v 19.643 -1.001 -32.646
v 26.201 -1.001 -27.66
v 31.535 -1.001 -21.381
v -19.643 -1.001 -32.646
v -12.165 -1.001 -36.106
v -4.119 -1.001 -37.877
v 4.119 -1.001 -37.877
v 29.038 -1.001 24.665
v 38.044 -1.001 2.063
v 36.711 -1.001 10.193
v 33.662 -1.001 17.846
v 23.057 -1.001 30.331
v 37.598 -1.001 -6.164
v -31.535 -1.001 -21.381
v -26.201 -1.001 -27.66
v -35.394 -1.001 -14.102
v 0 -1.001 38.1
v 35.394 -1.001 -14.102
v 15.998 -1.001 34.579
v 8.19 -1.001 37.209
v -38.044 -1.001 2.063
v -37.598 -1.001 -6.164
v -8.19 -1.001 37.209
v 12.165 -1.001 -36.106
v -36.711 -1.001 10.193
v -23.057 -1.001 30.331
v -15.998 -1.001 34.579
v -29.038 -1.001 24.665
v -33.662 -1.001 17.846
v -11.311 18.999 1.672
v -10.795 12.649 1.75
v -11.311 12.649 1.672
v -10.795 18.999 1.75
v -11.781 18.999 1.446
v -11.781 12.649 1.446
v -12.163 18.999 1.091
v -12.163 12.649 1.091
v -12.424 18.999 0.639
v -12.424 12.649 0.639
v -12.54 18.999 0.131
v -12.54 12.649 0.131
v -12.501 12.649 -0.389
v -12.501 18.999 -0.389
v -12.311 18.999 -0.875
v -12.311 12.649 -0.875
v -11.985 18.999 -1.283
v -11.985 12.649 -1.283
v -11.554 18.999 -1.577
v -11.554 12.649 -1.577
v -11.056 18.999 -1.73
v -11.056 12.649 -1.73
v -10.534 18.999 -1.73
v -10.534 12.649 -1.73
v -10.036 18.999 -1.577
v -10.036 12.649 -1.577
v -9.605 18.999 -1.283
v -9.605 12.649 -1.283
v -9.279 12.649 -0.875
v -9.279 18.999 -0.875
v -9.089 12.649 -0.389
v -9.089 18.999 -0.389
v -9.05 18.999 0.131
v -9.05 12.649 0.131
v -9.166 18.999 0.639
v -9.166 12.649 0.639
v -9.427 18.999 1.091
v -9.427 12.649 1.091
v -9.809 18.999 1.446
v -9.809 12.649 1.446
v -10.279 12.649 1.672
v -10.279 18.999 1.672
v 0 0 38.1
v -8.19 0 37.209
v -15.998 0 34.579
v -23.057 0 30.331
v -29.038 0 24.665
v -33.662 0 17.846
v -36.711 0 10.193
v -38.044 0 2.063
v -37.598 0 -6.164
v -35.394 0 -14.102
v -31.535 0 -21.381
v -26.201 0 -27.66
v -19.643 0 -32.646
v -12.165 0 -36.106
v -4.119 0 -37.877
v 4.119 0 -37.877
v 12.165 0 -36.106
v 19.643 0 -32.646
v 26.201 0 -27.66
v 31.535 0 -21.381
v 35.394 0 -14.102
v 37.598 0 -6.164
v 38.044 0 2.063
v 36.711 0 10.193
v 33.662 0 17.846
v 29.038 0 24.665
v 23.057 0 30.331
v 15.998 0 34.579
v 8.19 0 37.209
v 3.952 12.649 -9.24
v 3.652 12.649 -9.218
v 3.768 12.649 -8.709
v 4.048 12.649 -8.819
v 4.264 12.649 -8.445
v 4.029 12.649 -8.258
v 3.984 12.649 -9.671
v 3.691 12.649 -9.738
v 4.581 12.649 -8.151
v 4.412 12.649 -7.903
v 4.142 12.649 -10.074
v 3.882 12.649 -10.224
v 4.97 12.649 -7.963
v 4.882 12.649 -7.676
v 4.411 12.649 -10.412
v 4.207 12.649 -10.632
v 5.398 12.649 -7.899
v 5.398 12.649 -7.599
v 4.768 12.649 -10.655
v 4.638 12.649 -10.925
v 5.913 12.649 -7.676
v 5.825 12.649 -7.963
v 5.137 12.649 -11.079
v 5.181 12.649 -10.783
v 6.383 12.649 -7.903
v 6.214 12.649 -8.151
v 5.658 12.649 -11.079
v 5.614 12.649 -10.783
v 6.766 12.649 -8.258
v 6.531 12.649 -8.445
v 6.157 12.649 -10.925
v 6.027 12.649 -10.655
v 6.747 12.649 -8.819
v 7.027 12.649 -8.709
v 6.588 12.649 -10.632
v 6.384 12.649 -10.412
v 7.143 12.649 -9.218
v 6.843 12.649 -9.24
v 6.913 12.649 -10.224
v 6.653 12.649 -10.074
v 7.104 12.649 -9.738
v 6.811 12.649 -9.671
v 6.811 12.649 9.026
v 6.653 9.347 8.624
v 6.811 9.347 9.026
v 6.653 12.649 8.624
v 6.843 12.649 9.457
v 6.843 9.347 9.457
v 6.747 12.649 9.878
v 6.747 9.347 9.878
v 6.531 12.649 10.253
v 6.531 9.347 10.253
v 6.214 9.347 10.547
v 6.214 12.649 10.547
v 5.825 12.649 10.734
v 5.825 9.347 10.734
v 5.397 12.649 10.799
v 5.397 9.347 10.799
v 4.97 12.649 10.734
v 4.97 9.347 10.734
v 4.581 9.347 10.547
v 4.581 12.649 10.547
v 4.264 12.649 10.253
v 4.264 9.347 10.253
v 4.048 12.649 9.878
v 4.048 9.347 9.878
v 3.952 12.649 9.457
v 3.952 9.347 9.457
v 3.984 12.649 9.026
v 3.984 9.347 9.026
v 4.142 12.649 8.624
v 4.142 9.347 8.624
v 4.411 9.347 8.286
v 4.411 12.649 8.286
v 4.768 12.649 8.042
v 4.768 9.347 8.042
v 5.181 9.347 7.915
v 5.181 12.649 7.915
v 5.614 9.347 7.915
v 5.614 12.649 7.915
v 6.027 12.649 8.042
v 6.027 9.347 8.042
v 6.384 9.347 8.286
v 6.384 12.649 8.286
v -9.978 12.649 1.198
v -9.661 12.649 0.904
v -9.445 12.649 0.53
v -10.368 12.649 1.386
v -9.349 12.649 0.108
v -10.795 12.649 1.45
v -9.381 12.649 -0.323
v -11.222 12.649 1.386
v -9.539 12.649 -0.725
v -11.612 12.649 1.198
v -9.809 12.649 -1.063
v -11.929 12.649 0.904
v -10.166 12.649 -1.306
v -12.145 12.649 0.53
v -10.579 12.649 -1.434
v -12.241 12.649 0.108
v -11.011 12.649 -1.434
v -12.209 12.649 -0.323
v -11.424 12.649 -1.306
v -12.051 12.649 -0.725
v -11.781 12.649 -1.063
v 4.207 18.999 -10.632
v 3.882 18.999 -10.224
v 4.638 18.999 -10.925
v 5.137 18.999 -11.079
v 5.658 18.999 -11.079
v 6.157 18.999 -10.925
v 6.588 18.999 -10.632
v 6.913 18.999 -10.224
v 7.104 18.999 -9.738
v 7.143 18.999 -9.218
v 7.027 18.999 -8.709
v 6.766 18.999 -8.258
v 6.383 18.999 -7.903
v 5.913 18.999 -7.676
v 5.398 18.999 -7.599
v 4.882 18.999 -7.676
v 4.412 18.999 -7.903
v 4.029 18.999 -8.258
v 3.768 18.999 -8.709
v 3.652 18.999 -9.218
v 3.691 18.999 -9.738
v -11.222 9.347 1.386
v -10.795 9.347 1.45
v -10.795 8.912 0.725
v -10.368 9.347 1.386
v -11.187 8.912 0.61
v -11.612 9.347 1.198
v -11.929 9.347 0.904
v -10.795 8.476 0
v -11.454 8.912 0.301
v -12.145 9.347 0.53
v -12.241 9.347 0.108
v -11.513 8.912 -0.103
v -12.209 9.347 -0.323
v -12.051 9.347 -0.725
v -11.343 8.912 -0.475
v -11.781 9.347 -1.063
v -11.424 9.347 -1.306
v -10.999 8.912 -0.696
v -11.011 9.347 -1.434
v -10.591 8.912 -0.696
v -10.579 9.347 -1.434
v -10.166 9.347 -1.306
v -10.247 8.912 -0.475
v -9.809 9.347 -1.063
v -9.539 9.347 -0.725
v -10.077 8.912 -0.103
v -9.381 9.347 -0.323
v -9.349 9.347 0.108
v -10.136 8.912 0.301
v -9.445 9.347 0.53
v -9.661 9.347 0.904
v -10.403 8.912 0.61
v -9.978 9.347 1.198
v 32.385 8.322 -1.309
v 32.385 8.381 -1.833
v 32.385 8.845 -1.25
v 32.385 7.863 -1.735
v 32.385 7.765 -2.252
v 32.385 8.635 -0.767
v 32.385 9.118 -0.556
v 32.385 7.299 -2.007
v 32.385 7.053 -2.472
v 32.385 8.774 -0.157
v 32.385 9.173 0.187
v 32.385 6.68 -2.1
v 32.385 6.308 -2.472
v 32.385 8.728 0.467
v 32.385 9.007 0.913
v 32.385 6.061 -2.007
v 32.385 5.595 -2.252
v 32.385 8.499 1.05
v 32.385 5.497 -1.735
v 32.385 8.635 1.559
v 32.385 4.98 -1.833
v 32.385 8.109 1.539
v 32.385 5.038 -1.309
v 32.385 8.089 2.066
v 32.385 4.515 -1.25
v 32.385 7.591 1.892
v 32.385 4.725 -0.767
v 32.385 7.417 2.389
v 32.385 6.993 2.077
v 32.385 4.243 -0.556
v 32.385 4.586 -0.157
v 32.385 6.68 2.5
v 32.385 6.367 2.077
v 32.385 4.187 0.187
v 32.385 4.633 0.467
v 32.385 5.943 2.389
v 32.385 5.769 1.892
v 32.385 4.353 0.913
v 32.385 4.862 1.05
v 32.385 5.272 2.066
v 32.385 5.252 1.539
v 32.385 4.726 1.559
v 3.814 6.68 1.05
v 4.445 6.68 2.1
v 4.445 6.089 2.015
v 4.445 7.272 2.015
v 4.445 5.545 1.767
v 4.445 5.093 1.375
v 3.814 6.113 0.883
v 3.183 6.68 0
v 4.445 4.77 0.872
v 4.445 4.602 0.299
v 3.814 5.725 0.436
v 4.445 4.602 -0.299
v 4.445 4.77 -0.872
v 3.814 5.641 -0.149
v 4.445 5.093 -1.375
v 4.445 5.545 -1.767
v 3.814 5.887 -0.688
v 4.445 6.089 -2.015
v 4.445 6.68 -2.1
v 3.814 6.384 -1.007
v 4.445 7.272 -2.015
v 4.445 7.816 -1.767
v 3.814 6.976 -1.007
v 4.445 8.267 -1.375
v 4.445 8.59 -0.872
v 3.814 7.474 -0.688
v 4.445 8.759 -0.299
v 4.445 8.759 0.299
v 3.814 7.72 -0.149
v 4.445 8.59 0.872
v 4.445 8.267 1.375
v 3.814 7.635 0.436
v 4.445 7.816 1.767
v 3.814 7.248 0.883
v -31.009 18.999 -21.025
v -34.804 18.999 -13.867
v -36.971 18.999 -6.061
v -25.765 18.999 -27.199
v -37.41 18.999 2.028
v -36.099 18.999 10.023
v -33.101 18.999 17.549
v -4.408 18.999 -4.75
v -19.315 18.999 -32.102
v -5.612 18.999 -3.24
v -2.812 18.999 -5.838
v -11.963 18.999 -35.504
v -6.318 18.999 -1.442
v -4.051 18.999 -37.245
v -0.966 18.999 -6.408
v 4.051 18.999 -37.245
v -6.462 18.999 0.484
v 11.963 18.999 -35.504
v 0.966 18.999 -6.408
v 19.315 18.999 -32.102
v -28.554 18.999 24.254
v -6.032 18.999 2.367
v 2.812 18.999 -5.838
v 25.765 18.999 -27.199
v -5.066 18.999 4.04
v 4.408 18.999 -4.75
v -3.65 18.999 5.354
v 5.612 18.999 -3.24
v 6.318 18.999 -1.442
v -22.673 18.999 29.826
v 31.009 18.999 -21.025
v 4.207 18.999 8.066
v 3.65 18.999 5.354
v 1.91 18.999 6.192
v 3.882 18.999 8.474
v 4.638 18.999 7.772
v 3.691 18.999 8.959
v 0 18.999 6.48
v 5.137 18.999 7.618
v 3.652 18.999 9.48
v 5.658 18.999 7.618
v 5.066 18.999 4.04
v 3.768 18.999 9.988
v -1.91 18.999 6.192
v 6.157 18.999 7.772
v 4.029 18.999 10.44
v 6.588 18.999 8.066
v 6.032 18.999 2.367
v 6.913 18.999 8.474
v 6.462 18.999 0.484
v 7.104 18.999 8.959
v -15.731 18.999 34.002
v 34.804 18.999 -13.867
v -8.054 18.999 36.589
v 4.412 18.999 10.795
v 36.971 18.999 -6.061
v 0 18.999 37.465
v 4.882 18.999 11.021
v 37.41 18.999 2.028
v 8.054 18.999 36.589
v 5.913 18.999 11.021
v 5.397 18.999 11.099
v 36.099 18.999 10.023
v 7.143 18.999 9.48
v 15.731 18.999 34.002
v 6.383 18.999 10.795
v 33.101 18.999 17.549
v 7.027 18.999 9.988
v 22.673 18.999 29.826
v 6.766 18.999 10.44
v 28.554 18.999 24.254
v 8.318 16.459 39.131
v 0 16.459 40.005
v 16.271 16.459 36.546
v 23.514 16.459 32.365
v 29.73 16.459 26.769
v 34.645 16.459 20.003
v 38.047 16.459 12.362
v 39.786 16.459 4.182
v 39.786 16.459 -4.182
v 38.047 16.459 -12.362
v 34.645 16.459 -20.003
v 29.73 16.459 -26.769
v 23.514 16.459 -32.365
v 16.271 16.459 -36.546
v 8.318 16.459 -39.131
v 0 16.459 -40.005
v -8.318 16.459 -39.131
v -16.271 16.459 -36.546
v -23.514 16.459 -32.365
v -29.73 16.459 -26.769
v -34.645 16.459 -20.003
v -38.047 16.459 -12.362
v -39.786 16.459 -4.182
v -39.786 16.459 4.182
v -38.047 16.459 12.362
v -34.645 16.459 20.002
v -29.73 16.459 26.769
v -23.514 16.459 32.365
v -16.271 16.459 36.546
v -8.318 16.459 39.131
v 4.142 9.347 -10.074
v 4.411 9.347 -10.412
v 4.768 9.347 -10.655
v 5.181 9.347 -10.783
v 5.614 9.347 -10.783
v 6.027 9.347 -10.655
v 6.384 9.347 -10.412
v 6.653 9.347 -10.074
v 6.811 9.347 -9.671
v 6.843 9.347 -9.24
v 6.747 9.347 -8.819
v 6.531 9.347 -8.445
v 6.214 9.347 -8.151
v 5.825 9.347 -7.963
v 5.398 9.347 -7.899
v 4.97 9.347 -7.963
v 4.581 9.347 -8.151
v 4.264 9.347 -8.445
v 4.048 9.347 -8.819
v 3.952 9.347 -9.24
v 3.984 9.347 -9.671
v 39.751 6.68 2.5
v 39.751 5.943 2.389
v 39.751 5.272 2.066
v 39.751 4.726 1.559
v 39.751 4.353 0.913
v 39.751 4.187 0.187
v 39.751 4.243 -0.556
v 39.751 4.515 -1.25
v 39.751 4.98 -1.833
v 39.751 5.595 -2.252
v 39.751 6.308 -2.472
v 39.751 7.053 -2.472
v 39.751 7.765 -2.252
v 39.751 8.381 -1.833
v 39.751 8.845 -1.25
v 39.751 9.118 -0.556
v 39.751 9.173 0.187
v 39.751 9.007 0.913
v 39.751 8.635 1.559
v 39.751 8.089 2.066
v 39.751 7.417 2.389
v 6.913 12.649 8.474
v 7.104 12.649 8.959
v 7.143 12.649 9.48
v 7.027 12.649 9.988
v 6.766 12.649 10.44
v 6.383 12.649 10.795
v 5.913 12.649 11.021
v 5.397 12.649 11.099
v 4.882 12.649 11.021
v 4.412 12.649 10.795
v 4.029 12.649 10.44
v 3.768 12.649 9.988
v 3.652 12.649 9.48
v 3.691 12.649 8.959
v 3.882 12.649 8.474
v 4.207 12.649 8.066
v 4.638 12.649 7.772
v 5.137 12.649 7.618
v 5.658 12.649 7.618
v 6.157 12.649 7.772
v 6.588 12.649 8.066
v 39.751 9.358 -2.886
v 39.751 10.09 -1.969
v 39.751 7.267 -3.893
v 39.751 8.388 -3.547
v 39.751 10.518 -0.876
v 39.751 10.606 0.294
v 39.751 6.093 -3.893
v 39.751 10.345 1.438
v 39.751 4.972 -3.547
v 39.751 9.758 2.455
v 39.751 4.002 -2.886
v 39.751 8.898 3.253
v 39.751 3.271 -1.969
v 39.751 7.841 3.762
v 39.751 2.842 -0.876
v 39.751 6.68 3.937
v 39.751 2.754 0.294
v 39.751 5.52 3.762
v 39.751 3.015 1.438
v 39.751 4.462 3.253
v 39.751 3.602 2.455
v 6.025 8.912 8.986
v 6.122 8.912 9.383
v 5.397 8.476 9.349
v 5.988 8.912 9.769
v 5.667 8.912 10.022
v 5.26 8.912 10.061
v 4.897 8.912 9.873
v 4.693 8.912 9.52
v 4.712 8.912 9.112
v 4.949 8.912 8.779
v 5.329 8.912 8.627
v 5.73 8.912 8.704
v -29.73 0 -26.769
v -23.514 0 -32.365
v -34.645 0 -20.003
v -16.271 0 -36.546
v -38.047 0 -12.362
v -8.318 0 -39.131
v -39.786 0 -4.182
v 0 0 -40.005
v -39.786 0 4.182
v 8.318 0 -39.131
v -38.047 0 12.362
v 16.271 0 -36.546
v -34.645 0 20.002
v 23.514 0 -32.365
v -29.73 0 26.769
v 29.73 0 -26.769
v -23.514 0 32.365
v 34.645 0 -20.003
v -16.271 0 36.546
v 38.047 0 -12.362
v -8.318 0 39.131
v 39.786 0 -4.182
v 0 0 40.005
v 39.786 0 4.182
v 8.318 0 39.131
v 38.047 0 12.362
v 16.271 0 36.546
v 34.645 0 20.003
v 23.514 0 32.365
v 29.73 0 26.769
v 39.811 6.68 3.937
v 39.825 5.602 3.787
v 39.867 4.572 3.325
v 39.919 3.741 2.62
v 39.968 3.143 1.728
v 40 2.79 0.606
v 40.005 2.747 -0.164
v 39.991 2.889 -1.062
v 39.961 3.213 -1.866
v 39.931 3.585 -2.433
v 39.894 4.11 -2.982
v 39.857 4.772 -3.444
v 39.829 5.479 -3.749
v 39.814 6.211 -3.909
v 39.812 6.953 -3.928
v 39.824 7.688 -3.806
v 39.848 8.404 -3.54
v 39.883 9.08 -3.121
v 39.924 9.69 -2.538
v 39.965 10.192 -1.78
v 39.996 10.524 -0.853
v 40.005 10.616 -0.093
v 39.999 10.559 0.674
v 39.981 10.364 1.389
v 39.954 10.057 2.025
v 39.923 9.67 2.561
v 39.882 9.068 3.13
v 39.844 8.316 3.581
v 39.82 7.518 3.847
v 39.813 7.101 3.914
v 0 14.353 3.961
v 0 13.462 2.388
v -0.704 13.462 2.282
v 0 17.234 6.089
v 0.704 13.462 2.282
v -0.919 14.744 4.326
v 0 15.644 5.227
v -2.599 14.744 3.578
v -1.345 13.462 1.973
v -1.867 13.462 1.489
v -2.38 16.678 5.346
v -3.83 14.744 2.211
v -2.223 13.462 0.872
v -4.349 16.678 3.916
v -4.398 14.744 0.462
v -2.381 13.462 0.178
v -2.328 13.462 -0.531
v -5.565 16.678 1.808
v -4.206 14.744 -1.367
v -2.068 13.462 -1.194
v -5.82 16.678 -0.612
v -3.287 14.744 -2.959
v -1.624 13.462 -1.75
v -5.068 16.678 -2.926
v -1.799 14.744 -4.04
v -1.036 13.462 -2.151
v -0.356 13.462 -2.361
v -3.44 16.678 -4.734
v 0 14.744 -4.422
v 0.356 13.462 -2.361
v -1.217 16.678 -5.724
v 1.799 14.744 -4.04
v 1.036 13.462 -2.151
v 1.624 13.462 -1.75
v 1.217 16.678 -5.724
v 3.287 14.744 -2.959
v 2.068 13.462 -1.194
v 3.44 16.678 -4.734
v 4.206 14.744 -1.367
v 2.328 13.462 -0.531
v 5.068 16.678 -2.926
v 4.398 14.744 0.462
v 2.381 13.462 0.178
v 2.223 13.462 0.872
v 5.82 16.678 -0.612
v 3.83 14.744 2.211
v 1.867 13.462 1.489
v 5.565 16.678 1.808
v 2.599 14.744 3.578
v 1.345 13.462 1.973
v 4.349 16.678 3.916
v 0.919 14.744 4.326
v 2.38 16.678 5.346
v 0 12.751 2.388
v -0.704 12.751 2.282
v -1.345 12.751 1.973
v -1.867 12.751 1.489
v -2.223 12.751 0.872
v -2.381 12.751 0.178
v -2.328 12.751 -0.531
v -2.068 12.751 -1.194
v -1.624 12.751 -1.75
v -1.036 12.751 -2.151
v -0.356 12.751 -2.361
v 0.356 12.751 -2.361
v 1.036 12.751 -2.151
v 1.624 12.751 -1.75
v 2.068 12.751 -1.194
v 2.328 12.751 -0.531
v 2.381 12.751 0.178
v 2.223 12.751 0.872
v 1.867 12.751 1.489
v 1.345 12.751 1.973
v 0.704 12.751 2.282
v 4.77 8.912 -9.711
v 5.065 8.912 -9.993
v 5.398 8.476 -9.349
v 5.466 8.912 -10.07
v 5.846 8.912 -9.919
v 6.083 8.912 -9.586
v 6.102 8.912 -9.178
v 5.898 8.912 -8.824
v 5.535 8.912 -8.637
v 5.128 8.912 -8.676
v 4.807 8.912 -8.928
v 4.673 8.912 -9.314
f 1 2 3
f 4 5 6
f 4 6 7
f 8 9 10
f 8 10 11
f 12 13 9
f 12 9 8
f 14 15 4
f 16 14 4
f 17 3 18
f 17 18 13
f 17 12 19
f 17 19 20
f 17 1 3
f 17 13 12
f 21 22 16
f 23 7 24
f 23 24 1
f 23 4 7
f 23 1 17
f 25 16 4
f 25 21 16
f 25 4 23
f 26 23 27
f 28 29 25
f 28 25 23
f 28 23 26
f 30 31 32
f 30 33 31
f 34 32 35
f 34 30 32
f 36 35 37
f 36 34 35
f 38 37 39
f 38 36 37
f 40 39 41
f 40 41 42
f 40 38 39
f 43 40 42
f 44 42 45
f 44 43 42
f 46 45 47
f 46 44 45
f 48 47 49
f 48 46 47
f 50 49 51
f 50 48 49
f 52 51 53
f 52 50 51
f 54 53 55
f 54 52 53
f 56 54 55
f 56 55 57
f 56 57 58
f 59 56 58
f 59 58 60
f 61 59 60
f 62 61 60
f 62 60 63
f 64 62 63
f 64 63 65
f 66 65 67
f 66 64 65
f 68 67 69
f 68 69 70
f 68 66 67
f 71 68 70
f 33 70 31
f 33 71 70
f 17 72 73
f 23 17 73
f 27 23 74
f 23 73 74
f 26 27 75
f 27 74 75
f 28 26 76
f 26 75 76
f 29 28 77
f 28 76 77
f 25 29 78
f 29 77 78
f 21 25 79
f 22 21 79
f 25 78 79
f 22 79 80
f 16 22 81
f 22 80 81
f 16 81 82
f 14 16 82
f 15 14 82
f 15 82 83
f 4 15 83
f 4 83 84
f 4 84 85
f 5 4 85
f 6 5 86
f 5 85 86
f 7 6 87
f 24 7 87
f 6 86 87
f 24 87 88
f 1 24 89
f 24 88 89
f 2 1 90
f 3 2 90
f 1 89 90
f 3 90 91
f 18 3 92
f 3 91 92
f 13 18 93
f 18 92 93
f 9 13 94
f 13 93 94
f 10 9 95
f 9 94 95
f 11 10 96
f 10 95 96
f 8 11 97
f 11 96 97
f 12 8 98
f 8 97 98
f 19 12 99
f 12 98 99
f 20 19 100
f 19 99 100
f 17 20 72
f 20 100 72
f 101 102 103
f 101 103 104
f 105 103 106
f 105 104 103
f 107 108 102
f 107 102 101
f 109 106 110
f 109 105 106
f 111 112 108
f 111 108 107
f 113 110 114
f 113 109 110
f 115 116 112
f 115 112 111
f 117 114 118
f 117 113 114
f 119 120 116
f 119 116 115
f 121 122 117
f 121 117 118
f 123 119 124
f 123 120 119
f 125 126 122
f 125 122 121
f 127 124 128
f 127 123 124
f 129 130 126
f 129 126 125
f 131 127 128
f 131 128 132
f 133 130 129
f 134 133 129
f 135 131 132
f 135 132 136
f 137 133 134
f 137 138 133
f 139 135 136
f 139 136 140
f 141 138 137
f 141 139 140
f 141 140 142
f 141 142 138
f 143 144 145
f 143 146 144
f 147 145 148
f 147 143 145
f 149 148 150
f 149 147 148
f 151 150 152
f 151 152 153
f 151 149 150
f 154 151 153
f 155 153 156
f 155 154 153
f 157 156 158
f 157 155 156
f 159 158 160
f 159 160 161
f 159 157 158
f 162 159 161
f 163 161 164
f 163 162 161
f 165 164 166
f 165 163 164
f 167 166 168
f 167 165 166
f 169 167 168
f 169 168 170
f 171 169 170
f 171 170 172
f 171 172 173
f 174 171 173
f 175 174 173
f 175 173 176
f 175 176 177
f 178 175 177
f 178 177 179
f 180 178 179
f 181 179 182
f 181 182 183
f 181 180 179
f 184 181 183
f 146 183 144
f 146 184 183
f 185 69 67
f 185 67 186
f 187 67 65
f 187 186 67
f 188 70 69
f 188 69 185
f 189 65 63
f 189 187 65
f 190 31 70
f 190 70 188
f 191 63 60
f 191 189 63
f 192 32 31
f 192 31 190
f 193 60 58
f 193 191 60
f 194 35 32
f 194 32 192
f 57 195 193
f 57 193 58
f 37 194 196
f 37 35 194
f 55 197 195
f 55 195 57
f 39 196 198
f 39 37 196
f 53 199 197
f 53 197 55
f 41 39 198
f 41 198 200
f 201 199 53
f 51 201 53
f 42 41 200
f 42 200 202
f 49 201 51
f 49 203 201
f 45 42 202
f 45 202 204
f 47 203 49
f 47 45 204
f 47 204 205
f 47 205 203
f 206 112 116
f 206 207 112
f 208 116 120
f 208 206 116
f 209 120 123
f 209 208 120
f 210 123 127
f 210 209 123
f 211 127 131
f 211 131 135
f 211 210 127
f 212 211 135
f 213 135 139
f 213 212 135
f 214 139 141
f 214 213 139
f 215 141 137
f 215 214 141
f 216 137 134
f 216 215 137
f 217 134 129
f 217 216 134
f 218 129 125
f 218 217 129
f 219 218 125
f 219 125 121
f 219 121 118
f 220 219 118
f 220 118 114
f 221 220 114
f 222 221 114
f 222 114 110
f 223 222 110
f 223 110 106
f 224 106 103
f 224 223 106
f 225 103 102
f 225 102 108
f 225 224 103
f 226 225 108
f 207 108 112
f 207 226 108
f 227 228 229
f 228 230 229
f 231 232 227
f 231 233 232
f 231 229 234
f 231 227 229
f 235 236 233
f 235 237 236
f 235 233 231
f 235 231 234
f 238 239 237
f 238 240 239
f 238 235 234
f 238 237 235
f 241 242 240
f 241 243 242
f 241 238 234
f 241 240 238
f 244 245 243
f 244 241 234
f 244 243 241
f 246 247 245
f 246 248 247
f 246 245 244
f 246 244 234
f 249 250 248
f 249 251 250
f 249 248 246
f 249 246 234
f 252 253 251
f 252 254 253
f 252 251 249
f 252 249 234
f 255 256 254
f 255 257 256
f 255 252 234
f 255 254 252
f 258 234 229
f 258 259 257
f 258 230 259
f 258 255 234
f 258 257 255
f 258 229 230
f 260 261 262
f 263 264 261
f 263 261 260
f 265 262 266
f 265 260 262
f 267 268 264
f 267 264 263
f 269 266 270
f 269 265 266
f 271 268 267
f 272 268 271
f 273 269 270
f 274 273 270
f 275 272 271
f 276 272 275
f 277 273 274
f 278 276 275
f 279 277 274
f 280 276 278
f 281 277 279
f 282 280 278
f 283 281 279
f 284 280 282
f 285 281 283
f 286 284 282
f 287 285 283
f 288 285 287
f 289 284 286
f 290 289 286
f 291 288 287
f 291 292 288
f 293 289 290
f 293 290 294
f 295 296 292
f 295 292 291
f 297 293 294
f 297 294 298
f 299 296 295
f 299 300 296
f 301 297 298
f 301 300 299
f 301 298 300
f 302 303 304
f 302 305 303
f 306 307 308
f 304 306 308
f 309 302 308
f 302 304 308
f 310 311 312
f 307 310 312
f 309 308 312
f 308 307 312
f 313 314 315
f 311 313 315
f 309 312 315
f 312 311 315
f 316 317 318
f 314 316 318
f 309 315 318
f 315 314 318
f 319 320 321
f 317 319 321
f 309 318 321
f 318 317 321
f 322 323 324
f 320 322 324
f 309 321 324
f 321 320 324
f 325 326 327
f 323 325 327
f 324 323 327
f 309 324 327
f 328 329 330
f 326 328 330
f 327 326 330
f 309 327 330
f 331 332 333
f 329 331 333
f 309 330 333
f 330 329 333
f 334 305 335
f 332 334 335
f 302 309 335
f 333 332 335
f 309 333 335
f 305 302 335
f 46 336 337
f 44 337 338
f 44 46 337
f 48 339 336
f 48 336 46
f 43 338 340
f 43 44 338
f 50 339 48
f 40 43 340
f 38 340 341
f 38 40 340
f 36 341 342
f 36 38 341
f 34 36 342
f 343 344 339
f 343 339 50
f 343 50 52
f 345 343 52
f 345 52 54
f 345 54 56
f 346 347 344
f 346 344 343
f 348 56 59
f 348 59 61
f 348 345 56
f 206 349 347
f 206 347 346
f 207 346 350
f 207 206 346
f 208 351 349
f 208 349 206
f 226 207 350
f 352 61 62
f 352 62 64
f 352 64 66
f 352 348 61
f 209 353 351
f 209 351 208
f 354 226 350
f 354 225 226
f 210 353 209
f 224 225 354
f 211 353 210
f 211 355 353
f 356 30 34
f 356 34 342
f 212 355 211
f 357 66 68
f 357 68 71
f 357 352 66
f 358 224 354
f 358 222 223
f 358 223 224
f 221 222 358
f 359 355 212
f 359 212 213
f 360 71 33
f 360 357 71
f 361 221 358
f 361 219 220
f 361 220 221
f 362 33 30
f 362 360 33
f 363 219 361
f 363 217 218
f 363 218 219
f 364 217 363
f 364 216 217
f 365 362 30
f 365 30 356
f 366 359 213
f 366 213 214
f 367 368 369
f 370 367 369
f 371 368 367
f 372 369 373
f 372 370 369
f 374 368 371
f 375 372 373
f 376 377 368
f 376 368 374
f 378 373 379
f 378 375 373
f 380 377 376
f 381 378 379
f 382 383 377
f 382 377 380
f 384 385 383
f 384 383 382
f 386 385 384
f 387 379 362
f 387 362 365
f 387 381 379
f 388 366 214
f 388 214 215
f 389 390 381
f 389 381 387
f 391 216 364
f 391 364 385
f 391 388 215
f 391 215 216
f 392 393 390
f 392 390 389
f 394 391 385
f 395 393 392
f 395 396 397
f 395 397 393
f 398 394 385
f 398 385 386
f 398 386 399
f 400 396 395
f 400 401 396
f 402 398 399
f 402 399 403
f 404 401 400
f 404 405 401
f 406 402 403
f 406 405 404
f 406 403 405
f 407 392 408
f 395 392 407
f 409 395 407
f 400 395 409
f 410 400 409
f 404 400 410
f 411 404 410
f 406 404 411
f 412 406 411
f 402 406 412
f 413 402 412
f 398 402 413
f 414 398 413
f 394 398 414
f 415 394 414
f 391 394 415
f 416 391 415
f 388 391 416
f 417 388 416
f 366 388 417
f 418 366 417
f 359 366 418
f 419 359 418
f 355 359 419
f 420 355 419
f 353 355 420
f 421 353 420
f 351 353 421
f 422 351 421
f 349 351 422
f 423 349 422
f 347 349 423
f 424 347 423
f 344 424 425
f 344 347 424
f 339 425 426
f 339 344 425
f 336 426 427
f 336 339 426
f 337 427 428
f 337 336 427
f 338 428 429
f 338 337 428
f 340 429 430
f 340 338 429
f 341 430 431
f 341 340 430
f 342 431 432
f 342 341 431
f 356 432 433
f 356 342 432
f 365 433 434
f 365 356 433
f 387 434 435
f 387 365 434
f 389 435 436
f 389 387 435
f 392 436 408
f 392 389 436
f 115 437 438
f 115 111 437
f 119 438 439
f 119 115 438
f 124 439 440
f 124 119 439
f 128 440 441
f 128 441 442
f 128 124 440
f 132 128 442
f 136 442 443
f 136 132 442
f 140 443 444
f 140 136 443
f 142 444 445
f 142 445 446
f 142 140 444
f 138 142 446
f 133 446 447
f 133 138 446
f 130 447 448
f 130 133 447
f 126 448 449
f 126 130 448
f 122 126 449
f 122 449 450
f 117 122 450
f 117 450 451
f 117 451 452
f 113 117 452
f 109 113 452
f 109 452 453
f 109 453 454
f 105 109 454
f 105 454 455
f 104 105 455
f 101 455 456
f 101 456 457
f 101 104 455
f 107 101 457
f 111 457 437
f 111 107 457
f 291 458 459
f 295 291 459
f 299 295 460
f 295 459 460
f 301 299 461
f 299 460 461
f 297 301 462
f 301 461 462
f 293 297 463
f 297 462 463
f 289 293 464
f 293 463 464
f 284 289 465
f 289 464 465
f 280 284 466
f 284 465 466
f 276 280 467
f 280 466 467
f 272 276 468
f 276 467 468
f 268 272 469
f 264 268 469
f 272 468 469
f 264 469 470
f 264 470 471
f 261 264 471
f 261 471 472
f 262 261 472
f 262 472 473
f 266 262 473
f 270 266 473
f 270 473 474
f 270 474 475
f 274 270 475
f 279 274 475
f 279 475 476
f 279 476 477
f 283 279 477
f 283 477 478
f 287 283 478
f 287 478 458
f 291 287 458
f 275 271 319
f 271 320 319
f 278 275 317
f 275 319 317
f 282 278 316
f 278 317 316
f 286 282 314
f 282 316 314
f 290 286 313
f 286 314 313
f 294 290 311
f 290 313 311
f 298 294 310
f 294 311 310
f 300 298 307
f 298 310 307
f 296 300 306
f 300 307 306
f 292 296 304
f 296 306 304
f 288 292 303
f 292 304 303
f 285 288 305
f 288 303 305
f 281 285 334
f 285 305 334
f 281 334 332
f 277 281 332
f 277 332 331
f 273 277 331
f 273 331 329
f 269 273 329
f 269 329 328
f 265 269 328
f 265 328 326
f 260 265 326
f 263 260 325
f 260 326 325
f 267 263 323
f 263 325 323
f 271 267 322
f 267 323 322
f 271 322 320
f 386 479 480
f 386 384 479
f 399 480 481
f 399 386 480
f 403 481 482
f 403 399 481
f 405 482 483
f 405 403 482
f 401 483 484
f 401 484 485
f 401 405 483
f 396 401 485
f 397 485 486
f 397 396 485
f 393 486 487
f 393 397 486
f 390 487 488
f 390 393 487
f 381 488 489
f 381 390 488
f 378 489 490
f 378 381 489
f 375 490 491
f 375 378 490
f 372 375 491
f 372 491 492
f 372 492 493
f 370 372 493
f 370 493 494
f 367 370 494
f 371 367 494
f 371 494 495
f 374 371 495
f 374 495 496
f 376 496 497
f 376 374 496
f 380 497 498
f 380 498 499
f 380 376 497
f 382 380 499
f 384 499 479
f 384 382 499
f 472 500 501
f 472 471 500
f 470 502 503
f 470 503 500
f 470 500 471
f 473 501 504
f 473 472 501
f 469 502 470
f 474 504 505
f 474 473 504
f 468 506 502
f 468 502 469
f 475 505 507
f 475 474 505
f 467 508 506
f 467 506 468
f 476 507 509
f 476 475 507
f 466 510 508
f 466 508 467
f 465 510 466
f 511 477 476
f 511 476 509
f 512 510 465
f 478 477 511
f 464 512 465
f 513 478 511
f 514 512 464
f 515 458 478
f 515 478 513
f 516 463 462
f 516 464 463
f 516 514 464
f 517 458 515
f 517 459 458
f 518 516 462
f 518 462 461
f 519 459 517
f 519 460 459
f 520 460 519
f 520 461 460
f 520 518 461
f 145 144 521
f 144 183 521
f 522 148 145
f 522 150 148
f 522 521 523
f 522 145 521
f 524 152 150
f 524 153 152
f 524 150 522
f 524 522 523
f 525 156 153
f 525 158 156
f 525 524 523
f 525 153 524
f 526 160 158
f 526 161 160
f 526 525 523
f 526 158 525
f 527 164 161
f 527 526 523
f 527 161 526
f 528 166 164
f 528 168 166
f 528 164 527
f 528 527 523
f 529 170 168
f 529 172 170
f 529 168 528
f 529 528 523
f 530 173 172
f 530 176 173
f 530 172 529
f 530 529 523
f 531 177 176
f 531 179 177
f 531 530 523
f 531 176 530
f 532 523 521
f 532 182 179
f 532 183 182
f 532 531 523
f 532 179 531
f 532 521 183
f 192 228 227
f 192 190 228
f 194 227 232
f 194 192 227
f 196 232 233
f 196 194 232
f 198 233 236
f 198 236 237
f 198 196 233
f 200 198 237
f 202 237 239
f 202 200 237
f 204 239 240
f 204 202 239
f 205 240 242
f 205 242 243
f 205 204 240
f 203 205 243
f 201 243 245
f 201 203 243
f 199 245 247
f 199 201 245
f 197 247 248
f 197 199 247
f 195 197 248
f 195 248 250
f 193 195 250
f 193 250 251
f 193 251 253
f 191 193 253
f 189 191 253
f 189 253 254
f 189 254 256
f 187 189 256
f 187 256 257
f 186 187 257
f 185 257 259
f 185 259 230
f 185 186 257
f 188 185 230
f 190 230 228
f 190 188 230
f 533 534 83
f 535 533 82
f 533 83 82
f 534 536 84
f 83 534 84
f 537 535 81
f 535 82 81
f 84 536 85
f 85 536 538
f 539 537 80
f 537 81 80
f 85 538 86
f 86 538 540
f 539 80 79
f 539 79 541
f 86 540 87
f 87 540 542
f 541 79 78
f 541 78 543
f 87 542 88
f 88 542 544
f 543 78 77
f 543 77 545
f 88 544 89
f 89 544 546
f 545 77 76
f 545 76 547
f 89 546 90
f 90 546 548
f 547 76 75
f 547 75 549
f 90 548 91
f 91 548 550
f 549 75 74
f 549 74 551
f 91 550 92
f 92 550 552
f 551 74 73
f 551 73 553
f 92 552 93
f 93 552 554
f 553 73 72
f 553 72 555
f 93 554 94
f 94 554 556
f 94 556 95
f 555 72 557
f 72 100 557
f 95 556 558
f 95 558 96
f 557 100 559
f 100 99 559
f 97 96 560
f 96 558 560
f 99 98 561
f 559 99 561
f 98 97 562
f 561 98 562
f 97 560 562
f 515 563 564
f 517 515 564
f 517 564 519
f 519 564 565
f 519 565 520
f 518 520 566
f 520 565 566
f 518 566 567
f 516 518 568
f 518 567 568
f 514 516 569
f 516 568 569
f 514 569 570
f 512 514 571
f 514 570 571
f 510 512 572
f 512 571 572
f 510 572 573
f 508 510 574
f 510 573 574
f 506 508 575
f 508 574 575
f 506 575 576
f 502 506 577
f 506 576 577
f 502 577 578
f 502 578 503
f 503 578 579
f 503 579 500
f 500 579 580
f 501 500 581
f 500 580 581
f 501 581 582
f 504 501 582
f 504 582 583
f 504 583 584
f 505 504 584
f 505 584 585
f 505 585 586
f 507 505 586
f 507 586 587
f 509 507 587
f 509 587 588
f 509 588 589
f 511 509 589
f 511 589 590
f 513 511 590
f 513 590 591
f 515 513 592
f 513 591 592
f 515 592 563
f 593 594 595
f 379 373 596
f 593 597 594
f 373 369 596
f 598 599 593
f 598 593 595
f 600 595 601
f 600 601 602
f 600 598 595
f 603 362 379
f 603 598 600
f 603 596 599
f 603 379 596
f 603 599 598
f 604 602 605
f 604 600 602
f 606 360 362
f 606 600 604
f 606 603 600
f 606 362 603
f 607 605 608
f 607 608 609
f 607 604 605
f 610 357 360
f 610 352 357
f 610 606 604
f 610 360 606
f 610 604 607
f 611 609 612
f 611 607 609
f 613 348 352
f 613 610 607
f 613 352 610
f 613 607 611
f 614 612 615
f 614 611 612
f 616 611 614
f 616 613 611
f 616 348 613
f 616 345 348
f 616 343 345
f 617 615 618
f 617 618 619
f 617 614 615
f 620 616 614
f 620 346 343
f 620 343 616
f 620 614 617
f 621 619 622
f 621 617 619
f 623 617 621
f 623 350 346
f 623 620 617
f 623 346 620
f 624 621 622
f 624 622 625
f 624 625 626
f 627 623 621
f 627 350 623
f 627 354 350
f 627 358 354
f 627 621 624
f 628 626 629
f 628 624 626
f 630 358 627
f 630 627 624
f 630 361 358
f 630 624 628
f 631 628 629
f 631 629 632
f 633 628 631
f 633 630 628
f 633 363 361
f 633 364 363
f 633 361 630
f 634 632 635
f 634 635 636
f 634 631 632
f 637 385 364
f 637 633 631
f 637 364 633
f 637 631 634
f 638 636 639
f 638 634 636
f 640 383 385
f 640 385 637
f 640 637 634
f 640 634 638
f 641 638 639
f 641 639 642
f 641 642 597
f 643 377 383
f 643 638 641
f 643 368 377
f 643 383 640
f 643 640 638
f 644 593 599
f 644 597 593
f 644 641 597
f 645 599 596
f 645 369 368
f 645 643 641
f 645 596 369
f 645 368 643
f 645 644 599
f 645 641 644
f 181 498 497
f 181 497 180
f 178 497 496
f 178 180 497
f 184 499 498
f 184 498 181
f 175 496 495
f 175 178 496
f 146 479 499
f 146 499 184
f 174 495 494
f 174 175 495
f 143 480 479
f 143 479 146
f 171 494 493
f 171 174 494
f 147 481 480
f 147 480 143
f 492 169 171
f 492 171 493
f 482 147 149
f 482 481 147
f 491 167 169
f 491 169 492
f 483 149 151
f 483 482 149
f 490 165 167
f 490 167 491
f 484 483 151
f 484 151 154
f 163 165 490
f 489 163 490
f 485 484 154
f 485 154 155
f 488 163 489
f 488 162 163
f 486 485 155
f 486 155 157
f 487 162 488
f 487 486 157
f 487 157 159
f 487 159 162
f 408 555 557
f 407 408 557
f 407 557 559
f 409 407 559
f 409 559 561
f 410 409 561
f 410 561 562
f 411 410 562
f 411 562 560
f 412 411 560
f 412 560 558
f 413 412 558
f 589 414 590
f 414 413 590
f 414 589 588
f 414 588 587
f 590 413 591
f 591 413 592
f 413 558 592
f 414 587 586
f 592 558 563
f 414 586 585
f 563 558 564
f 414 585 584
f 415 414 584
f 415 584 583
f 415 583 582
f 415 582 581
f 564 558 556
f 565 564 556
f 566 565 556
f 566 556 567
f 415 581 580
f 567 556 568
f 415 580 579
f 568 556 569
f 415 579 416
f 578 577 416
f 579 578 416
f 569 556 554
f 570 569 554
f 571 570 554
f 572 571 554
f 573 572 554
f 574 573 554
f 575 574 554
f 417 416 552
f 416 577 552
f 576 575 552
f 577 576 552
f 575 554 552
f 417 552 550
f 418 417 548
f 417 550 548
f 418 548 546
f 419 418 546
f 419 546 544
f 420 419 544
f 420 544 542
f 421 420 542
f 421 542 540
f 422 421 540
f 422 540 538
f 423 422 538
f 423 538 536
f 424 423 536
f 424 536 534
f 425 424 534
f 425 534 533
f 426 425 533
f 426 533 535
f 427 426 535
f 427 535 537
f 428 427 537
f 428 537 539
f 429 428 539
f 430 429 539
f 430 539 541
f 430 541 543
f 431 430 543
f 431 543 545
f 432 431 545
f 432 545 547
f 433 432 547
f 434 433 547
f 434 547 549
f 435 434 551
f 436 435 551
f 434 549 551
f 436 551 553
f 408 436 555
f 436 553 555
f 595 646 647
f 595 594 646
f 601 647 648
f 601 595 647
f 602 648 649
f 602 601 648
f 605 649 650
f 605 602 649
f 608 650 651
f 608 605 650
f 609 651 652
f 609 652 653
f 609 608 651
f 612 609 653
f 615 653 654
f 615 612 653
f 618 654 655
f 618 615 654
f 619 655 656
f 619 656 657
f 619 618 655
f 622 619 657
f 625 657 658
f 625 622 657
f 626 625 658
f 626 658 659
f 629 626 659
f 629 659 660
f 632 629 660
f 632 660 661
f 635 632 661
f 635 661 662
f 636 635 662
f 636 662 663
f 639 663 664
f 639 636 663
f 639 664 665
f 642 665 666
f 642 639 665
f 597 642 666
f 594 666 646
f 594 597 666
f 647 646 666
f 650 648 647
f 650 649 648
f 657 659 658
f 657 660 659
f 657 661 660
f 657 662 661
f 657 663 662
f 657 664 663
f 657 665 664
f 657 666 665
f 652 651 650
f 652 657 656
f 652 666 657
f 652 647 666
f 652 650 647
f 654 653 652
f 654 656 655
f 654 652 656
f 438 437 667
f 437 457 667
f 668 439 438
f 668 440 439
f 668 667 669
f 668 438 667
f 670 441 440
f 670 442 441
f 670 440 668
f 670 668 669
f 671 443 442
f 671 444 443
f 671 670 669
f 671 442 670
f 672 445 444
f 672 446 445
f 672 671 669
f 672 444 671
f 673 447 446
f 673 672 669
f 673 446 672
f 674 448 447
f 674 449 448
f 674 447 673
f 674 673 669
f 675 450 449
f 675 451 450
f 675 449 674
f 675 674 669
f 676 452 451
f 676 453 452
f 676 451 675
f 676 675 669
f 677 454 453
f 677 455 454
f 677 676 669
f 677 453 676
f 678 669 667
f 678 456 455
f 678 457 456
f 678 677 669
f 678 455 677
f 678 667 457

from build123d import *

# Parameters (mm, degrees)
SKETCH1_R                       = 40.005
EXTRUDE1_DEPTH                  = 18.9992
M5X0_8_TAPPED_HOLE1_D           = 4.2
M5X0_8_TAPPED_HOLE1_DEPTH       = 35.56
M5X0_8_TAPPED_HOLE1_CBORE_D     = 5
M5X0_8_TAPPED_HOLE1_CBORE_DEPTH = 7.62
M5X0_8_TAPPED_HOLE1_TIP         = 1.2618073
HOLE3_D                         = 3.81
HOLE3_DEPTH                     = 6.35
HOLE3_CBORE_D                   = 7.874
HOLE3_CBORE_DEPTH               = 0.254
HOLE3_TIP                       = 1.144639479
CHAMFER1_SIZE                   = 2.54
CIRPATTERN1_COUNT               = 3
SKETCH2_R                       = 38.1
EXTRUDE2_DEPTH                  = 1.00075996


with BuildPart() as part:
    # Sketch1 → Extrude1 (new body)
    with BuildSketch(Plane(origin=(0, 0, 0), x_dir=(1, 0, 0), z_dir=(0, 1, 0))):
        with Locations(Location((0, 0, 0), (0, 0, 270))):  # turned: the seam where the file's is
            Circle(SKETCH1_R)
    extrude(amount=EXTRUDE1_DEPTH)

    # M5x0.8 Tapped Hole1
    with Locations(Plane(origin=(40.005, 6.6802, 0), x_dir=(0, 0, 1), z_dir=(1, 0, 0))):
        with Locations((0, 0)):
            CounterBoreHole(M5X0_8_TAPPED_HOLE1_D / 2, M5X0_8_TAPPED_HOLE1_CBORE_D / 2, M5X0_8_TAPPED_HOLE1_CBORE_DEPTH, depth=M5X0_8_TAPPED_HOLE1_DEPTH)
            with Locations((0, 0, -(M5X0_8_TAPPED_HOLE1_DEPTH + M5X0_8_TAPPED_HOLE1_TIP / 2))):  # 118° drill point
                Cone(0, M5X0_8_TAPPED_HOLE1_D / 2, M5X0_8_TAPPED_HOLE1_TIP, mode=Mode.SUBTRACT)

    # Hole3
    with Locations(Plane(origin=(40.005, 6.6802, 0), x_dir=(0, 0, 1), z_dir=(1, 0, 0))):
        with Locations((0, 0)):
            CounterBoreHole(HOLE3_D / 2, HOLE3_CBORE_D / 2, HOLE3_CBORE_DEPTH, depth=HOLE3_DEPTH)
            with Locations((0, 0, -(HOLE3_DEPTH + HOLE3_TIP / 2))):  # 118° drill point
                Cone(0, HOLE3_D / 2, HOLE3_TIP, mode=Mode.SUBTRACT)

    # Chamfer1
    chamfer1_edges = [part.edges().sort_by_distance(p)[0] for p in [
        (0, 18.9992, -40.005),
    ]]
    chamfer(chamfer1_edges, length=CHAMFER1_SIZE)

    # Sketch9 → M3.5x0.6 Tapped Hole1 (revolve, cut)
    with BuildSketch(Plane(origin=(-10.795, 18.9992, 0), x_dir=(0, 0, 1), z_dir=(1, 0, 0))):
        Polygon((0, 0), (0, 10.523247898), (1.45, 9.652), (1.45, 6.35), (1.75, 6.35), (1.75, 0), align=None)
    m3_5x0_6_tapped_hole1 = revolve(axis=Axis((-10.795, 25.3492, 0), (0, -1, 0)), mode=Mode.SUBTRACT)

    # CirPattern1: M3.5x0.6 Tapped Hole1 ×3 about axis
    cirpattern1_axis = Axis((0, 0, 0), (0, 1, 0))
    for i in range(1, CIRPATTERN1_COUNT):
        add(m3_5x0_6_tapped_hole1.rotate(cirpattern1_axis, i * 360 / CIRPATTERN1_COUNT), mode=Mode.SUBTRACT)

    # Sketch2 → Extrude2 (add)
    with BuildSketch(Plane.XZ):
        with Locations(Location((0, 0, 0), (0, 0, 90))):  # turned: the seam where the file's is
            Circle(SKETCH2_R)
    extrude(amount=EXTRUDE2_DEPTH)

    # Sketch11 → Cut-Revolve1 (revolve, cut)
    with BuildSketch(Plane.XY, mode=Mode.PRIVATE) as cut_revolve1_sk:
        with BuildLine():
            Line((0, 18.9992), (0, 12.7508))
            Line((0, 12.7508), (2.3876, 12.7508))
            Line((2.3876, 12.7508), (2.3876, 13.461592815))
            ThreePointArc((2.3876, 13.461592815), (5.227368483, 15.64396059), (6.480118517, 18.9992))
            Line((6.480118517, 18.9992), (0, 18.9992))
        make_face()
    revolve(cut_revolve1_sk.sketch.rotate(Axis((0, 20.578481537, 0), (0, -1, 0)), 90), axis=Axis((0, 20.578481537, 0), (0, -1, 0)), mode=Mode.SUBTRACT)  # turned: the seam where the file's is


solid = part.part
